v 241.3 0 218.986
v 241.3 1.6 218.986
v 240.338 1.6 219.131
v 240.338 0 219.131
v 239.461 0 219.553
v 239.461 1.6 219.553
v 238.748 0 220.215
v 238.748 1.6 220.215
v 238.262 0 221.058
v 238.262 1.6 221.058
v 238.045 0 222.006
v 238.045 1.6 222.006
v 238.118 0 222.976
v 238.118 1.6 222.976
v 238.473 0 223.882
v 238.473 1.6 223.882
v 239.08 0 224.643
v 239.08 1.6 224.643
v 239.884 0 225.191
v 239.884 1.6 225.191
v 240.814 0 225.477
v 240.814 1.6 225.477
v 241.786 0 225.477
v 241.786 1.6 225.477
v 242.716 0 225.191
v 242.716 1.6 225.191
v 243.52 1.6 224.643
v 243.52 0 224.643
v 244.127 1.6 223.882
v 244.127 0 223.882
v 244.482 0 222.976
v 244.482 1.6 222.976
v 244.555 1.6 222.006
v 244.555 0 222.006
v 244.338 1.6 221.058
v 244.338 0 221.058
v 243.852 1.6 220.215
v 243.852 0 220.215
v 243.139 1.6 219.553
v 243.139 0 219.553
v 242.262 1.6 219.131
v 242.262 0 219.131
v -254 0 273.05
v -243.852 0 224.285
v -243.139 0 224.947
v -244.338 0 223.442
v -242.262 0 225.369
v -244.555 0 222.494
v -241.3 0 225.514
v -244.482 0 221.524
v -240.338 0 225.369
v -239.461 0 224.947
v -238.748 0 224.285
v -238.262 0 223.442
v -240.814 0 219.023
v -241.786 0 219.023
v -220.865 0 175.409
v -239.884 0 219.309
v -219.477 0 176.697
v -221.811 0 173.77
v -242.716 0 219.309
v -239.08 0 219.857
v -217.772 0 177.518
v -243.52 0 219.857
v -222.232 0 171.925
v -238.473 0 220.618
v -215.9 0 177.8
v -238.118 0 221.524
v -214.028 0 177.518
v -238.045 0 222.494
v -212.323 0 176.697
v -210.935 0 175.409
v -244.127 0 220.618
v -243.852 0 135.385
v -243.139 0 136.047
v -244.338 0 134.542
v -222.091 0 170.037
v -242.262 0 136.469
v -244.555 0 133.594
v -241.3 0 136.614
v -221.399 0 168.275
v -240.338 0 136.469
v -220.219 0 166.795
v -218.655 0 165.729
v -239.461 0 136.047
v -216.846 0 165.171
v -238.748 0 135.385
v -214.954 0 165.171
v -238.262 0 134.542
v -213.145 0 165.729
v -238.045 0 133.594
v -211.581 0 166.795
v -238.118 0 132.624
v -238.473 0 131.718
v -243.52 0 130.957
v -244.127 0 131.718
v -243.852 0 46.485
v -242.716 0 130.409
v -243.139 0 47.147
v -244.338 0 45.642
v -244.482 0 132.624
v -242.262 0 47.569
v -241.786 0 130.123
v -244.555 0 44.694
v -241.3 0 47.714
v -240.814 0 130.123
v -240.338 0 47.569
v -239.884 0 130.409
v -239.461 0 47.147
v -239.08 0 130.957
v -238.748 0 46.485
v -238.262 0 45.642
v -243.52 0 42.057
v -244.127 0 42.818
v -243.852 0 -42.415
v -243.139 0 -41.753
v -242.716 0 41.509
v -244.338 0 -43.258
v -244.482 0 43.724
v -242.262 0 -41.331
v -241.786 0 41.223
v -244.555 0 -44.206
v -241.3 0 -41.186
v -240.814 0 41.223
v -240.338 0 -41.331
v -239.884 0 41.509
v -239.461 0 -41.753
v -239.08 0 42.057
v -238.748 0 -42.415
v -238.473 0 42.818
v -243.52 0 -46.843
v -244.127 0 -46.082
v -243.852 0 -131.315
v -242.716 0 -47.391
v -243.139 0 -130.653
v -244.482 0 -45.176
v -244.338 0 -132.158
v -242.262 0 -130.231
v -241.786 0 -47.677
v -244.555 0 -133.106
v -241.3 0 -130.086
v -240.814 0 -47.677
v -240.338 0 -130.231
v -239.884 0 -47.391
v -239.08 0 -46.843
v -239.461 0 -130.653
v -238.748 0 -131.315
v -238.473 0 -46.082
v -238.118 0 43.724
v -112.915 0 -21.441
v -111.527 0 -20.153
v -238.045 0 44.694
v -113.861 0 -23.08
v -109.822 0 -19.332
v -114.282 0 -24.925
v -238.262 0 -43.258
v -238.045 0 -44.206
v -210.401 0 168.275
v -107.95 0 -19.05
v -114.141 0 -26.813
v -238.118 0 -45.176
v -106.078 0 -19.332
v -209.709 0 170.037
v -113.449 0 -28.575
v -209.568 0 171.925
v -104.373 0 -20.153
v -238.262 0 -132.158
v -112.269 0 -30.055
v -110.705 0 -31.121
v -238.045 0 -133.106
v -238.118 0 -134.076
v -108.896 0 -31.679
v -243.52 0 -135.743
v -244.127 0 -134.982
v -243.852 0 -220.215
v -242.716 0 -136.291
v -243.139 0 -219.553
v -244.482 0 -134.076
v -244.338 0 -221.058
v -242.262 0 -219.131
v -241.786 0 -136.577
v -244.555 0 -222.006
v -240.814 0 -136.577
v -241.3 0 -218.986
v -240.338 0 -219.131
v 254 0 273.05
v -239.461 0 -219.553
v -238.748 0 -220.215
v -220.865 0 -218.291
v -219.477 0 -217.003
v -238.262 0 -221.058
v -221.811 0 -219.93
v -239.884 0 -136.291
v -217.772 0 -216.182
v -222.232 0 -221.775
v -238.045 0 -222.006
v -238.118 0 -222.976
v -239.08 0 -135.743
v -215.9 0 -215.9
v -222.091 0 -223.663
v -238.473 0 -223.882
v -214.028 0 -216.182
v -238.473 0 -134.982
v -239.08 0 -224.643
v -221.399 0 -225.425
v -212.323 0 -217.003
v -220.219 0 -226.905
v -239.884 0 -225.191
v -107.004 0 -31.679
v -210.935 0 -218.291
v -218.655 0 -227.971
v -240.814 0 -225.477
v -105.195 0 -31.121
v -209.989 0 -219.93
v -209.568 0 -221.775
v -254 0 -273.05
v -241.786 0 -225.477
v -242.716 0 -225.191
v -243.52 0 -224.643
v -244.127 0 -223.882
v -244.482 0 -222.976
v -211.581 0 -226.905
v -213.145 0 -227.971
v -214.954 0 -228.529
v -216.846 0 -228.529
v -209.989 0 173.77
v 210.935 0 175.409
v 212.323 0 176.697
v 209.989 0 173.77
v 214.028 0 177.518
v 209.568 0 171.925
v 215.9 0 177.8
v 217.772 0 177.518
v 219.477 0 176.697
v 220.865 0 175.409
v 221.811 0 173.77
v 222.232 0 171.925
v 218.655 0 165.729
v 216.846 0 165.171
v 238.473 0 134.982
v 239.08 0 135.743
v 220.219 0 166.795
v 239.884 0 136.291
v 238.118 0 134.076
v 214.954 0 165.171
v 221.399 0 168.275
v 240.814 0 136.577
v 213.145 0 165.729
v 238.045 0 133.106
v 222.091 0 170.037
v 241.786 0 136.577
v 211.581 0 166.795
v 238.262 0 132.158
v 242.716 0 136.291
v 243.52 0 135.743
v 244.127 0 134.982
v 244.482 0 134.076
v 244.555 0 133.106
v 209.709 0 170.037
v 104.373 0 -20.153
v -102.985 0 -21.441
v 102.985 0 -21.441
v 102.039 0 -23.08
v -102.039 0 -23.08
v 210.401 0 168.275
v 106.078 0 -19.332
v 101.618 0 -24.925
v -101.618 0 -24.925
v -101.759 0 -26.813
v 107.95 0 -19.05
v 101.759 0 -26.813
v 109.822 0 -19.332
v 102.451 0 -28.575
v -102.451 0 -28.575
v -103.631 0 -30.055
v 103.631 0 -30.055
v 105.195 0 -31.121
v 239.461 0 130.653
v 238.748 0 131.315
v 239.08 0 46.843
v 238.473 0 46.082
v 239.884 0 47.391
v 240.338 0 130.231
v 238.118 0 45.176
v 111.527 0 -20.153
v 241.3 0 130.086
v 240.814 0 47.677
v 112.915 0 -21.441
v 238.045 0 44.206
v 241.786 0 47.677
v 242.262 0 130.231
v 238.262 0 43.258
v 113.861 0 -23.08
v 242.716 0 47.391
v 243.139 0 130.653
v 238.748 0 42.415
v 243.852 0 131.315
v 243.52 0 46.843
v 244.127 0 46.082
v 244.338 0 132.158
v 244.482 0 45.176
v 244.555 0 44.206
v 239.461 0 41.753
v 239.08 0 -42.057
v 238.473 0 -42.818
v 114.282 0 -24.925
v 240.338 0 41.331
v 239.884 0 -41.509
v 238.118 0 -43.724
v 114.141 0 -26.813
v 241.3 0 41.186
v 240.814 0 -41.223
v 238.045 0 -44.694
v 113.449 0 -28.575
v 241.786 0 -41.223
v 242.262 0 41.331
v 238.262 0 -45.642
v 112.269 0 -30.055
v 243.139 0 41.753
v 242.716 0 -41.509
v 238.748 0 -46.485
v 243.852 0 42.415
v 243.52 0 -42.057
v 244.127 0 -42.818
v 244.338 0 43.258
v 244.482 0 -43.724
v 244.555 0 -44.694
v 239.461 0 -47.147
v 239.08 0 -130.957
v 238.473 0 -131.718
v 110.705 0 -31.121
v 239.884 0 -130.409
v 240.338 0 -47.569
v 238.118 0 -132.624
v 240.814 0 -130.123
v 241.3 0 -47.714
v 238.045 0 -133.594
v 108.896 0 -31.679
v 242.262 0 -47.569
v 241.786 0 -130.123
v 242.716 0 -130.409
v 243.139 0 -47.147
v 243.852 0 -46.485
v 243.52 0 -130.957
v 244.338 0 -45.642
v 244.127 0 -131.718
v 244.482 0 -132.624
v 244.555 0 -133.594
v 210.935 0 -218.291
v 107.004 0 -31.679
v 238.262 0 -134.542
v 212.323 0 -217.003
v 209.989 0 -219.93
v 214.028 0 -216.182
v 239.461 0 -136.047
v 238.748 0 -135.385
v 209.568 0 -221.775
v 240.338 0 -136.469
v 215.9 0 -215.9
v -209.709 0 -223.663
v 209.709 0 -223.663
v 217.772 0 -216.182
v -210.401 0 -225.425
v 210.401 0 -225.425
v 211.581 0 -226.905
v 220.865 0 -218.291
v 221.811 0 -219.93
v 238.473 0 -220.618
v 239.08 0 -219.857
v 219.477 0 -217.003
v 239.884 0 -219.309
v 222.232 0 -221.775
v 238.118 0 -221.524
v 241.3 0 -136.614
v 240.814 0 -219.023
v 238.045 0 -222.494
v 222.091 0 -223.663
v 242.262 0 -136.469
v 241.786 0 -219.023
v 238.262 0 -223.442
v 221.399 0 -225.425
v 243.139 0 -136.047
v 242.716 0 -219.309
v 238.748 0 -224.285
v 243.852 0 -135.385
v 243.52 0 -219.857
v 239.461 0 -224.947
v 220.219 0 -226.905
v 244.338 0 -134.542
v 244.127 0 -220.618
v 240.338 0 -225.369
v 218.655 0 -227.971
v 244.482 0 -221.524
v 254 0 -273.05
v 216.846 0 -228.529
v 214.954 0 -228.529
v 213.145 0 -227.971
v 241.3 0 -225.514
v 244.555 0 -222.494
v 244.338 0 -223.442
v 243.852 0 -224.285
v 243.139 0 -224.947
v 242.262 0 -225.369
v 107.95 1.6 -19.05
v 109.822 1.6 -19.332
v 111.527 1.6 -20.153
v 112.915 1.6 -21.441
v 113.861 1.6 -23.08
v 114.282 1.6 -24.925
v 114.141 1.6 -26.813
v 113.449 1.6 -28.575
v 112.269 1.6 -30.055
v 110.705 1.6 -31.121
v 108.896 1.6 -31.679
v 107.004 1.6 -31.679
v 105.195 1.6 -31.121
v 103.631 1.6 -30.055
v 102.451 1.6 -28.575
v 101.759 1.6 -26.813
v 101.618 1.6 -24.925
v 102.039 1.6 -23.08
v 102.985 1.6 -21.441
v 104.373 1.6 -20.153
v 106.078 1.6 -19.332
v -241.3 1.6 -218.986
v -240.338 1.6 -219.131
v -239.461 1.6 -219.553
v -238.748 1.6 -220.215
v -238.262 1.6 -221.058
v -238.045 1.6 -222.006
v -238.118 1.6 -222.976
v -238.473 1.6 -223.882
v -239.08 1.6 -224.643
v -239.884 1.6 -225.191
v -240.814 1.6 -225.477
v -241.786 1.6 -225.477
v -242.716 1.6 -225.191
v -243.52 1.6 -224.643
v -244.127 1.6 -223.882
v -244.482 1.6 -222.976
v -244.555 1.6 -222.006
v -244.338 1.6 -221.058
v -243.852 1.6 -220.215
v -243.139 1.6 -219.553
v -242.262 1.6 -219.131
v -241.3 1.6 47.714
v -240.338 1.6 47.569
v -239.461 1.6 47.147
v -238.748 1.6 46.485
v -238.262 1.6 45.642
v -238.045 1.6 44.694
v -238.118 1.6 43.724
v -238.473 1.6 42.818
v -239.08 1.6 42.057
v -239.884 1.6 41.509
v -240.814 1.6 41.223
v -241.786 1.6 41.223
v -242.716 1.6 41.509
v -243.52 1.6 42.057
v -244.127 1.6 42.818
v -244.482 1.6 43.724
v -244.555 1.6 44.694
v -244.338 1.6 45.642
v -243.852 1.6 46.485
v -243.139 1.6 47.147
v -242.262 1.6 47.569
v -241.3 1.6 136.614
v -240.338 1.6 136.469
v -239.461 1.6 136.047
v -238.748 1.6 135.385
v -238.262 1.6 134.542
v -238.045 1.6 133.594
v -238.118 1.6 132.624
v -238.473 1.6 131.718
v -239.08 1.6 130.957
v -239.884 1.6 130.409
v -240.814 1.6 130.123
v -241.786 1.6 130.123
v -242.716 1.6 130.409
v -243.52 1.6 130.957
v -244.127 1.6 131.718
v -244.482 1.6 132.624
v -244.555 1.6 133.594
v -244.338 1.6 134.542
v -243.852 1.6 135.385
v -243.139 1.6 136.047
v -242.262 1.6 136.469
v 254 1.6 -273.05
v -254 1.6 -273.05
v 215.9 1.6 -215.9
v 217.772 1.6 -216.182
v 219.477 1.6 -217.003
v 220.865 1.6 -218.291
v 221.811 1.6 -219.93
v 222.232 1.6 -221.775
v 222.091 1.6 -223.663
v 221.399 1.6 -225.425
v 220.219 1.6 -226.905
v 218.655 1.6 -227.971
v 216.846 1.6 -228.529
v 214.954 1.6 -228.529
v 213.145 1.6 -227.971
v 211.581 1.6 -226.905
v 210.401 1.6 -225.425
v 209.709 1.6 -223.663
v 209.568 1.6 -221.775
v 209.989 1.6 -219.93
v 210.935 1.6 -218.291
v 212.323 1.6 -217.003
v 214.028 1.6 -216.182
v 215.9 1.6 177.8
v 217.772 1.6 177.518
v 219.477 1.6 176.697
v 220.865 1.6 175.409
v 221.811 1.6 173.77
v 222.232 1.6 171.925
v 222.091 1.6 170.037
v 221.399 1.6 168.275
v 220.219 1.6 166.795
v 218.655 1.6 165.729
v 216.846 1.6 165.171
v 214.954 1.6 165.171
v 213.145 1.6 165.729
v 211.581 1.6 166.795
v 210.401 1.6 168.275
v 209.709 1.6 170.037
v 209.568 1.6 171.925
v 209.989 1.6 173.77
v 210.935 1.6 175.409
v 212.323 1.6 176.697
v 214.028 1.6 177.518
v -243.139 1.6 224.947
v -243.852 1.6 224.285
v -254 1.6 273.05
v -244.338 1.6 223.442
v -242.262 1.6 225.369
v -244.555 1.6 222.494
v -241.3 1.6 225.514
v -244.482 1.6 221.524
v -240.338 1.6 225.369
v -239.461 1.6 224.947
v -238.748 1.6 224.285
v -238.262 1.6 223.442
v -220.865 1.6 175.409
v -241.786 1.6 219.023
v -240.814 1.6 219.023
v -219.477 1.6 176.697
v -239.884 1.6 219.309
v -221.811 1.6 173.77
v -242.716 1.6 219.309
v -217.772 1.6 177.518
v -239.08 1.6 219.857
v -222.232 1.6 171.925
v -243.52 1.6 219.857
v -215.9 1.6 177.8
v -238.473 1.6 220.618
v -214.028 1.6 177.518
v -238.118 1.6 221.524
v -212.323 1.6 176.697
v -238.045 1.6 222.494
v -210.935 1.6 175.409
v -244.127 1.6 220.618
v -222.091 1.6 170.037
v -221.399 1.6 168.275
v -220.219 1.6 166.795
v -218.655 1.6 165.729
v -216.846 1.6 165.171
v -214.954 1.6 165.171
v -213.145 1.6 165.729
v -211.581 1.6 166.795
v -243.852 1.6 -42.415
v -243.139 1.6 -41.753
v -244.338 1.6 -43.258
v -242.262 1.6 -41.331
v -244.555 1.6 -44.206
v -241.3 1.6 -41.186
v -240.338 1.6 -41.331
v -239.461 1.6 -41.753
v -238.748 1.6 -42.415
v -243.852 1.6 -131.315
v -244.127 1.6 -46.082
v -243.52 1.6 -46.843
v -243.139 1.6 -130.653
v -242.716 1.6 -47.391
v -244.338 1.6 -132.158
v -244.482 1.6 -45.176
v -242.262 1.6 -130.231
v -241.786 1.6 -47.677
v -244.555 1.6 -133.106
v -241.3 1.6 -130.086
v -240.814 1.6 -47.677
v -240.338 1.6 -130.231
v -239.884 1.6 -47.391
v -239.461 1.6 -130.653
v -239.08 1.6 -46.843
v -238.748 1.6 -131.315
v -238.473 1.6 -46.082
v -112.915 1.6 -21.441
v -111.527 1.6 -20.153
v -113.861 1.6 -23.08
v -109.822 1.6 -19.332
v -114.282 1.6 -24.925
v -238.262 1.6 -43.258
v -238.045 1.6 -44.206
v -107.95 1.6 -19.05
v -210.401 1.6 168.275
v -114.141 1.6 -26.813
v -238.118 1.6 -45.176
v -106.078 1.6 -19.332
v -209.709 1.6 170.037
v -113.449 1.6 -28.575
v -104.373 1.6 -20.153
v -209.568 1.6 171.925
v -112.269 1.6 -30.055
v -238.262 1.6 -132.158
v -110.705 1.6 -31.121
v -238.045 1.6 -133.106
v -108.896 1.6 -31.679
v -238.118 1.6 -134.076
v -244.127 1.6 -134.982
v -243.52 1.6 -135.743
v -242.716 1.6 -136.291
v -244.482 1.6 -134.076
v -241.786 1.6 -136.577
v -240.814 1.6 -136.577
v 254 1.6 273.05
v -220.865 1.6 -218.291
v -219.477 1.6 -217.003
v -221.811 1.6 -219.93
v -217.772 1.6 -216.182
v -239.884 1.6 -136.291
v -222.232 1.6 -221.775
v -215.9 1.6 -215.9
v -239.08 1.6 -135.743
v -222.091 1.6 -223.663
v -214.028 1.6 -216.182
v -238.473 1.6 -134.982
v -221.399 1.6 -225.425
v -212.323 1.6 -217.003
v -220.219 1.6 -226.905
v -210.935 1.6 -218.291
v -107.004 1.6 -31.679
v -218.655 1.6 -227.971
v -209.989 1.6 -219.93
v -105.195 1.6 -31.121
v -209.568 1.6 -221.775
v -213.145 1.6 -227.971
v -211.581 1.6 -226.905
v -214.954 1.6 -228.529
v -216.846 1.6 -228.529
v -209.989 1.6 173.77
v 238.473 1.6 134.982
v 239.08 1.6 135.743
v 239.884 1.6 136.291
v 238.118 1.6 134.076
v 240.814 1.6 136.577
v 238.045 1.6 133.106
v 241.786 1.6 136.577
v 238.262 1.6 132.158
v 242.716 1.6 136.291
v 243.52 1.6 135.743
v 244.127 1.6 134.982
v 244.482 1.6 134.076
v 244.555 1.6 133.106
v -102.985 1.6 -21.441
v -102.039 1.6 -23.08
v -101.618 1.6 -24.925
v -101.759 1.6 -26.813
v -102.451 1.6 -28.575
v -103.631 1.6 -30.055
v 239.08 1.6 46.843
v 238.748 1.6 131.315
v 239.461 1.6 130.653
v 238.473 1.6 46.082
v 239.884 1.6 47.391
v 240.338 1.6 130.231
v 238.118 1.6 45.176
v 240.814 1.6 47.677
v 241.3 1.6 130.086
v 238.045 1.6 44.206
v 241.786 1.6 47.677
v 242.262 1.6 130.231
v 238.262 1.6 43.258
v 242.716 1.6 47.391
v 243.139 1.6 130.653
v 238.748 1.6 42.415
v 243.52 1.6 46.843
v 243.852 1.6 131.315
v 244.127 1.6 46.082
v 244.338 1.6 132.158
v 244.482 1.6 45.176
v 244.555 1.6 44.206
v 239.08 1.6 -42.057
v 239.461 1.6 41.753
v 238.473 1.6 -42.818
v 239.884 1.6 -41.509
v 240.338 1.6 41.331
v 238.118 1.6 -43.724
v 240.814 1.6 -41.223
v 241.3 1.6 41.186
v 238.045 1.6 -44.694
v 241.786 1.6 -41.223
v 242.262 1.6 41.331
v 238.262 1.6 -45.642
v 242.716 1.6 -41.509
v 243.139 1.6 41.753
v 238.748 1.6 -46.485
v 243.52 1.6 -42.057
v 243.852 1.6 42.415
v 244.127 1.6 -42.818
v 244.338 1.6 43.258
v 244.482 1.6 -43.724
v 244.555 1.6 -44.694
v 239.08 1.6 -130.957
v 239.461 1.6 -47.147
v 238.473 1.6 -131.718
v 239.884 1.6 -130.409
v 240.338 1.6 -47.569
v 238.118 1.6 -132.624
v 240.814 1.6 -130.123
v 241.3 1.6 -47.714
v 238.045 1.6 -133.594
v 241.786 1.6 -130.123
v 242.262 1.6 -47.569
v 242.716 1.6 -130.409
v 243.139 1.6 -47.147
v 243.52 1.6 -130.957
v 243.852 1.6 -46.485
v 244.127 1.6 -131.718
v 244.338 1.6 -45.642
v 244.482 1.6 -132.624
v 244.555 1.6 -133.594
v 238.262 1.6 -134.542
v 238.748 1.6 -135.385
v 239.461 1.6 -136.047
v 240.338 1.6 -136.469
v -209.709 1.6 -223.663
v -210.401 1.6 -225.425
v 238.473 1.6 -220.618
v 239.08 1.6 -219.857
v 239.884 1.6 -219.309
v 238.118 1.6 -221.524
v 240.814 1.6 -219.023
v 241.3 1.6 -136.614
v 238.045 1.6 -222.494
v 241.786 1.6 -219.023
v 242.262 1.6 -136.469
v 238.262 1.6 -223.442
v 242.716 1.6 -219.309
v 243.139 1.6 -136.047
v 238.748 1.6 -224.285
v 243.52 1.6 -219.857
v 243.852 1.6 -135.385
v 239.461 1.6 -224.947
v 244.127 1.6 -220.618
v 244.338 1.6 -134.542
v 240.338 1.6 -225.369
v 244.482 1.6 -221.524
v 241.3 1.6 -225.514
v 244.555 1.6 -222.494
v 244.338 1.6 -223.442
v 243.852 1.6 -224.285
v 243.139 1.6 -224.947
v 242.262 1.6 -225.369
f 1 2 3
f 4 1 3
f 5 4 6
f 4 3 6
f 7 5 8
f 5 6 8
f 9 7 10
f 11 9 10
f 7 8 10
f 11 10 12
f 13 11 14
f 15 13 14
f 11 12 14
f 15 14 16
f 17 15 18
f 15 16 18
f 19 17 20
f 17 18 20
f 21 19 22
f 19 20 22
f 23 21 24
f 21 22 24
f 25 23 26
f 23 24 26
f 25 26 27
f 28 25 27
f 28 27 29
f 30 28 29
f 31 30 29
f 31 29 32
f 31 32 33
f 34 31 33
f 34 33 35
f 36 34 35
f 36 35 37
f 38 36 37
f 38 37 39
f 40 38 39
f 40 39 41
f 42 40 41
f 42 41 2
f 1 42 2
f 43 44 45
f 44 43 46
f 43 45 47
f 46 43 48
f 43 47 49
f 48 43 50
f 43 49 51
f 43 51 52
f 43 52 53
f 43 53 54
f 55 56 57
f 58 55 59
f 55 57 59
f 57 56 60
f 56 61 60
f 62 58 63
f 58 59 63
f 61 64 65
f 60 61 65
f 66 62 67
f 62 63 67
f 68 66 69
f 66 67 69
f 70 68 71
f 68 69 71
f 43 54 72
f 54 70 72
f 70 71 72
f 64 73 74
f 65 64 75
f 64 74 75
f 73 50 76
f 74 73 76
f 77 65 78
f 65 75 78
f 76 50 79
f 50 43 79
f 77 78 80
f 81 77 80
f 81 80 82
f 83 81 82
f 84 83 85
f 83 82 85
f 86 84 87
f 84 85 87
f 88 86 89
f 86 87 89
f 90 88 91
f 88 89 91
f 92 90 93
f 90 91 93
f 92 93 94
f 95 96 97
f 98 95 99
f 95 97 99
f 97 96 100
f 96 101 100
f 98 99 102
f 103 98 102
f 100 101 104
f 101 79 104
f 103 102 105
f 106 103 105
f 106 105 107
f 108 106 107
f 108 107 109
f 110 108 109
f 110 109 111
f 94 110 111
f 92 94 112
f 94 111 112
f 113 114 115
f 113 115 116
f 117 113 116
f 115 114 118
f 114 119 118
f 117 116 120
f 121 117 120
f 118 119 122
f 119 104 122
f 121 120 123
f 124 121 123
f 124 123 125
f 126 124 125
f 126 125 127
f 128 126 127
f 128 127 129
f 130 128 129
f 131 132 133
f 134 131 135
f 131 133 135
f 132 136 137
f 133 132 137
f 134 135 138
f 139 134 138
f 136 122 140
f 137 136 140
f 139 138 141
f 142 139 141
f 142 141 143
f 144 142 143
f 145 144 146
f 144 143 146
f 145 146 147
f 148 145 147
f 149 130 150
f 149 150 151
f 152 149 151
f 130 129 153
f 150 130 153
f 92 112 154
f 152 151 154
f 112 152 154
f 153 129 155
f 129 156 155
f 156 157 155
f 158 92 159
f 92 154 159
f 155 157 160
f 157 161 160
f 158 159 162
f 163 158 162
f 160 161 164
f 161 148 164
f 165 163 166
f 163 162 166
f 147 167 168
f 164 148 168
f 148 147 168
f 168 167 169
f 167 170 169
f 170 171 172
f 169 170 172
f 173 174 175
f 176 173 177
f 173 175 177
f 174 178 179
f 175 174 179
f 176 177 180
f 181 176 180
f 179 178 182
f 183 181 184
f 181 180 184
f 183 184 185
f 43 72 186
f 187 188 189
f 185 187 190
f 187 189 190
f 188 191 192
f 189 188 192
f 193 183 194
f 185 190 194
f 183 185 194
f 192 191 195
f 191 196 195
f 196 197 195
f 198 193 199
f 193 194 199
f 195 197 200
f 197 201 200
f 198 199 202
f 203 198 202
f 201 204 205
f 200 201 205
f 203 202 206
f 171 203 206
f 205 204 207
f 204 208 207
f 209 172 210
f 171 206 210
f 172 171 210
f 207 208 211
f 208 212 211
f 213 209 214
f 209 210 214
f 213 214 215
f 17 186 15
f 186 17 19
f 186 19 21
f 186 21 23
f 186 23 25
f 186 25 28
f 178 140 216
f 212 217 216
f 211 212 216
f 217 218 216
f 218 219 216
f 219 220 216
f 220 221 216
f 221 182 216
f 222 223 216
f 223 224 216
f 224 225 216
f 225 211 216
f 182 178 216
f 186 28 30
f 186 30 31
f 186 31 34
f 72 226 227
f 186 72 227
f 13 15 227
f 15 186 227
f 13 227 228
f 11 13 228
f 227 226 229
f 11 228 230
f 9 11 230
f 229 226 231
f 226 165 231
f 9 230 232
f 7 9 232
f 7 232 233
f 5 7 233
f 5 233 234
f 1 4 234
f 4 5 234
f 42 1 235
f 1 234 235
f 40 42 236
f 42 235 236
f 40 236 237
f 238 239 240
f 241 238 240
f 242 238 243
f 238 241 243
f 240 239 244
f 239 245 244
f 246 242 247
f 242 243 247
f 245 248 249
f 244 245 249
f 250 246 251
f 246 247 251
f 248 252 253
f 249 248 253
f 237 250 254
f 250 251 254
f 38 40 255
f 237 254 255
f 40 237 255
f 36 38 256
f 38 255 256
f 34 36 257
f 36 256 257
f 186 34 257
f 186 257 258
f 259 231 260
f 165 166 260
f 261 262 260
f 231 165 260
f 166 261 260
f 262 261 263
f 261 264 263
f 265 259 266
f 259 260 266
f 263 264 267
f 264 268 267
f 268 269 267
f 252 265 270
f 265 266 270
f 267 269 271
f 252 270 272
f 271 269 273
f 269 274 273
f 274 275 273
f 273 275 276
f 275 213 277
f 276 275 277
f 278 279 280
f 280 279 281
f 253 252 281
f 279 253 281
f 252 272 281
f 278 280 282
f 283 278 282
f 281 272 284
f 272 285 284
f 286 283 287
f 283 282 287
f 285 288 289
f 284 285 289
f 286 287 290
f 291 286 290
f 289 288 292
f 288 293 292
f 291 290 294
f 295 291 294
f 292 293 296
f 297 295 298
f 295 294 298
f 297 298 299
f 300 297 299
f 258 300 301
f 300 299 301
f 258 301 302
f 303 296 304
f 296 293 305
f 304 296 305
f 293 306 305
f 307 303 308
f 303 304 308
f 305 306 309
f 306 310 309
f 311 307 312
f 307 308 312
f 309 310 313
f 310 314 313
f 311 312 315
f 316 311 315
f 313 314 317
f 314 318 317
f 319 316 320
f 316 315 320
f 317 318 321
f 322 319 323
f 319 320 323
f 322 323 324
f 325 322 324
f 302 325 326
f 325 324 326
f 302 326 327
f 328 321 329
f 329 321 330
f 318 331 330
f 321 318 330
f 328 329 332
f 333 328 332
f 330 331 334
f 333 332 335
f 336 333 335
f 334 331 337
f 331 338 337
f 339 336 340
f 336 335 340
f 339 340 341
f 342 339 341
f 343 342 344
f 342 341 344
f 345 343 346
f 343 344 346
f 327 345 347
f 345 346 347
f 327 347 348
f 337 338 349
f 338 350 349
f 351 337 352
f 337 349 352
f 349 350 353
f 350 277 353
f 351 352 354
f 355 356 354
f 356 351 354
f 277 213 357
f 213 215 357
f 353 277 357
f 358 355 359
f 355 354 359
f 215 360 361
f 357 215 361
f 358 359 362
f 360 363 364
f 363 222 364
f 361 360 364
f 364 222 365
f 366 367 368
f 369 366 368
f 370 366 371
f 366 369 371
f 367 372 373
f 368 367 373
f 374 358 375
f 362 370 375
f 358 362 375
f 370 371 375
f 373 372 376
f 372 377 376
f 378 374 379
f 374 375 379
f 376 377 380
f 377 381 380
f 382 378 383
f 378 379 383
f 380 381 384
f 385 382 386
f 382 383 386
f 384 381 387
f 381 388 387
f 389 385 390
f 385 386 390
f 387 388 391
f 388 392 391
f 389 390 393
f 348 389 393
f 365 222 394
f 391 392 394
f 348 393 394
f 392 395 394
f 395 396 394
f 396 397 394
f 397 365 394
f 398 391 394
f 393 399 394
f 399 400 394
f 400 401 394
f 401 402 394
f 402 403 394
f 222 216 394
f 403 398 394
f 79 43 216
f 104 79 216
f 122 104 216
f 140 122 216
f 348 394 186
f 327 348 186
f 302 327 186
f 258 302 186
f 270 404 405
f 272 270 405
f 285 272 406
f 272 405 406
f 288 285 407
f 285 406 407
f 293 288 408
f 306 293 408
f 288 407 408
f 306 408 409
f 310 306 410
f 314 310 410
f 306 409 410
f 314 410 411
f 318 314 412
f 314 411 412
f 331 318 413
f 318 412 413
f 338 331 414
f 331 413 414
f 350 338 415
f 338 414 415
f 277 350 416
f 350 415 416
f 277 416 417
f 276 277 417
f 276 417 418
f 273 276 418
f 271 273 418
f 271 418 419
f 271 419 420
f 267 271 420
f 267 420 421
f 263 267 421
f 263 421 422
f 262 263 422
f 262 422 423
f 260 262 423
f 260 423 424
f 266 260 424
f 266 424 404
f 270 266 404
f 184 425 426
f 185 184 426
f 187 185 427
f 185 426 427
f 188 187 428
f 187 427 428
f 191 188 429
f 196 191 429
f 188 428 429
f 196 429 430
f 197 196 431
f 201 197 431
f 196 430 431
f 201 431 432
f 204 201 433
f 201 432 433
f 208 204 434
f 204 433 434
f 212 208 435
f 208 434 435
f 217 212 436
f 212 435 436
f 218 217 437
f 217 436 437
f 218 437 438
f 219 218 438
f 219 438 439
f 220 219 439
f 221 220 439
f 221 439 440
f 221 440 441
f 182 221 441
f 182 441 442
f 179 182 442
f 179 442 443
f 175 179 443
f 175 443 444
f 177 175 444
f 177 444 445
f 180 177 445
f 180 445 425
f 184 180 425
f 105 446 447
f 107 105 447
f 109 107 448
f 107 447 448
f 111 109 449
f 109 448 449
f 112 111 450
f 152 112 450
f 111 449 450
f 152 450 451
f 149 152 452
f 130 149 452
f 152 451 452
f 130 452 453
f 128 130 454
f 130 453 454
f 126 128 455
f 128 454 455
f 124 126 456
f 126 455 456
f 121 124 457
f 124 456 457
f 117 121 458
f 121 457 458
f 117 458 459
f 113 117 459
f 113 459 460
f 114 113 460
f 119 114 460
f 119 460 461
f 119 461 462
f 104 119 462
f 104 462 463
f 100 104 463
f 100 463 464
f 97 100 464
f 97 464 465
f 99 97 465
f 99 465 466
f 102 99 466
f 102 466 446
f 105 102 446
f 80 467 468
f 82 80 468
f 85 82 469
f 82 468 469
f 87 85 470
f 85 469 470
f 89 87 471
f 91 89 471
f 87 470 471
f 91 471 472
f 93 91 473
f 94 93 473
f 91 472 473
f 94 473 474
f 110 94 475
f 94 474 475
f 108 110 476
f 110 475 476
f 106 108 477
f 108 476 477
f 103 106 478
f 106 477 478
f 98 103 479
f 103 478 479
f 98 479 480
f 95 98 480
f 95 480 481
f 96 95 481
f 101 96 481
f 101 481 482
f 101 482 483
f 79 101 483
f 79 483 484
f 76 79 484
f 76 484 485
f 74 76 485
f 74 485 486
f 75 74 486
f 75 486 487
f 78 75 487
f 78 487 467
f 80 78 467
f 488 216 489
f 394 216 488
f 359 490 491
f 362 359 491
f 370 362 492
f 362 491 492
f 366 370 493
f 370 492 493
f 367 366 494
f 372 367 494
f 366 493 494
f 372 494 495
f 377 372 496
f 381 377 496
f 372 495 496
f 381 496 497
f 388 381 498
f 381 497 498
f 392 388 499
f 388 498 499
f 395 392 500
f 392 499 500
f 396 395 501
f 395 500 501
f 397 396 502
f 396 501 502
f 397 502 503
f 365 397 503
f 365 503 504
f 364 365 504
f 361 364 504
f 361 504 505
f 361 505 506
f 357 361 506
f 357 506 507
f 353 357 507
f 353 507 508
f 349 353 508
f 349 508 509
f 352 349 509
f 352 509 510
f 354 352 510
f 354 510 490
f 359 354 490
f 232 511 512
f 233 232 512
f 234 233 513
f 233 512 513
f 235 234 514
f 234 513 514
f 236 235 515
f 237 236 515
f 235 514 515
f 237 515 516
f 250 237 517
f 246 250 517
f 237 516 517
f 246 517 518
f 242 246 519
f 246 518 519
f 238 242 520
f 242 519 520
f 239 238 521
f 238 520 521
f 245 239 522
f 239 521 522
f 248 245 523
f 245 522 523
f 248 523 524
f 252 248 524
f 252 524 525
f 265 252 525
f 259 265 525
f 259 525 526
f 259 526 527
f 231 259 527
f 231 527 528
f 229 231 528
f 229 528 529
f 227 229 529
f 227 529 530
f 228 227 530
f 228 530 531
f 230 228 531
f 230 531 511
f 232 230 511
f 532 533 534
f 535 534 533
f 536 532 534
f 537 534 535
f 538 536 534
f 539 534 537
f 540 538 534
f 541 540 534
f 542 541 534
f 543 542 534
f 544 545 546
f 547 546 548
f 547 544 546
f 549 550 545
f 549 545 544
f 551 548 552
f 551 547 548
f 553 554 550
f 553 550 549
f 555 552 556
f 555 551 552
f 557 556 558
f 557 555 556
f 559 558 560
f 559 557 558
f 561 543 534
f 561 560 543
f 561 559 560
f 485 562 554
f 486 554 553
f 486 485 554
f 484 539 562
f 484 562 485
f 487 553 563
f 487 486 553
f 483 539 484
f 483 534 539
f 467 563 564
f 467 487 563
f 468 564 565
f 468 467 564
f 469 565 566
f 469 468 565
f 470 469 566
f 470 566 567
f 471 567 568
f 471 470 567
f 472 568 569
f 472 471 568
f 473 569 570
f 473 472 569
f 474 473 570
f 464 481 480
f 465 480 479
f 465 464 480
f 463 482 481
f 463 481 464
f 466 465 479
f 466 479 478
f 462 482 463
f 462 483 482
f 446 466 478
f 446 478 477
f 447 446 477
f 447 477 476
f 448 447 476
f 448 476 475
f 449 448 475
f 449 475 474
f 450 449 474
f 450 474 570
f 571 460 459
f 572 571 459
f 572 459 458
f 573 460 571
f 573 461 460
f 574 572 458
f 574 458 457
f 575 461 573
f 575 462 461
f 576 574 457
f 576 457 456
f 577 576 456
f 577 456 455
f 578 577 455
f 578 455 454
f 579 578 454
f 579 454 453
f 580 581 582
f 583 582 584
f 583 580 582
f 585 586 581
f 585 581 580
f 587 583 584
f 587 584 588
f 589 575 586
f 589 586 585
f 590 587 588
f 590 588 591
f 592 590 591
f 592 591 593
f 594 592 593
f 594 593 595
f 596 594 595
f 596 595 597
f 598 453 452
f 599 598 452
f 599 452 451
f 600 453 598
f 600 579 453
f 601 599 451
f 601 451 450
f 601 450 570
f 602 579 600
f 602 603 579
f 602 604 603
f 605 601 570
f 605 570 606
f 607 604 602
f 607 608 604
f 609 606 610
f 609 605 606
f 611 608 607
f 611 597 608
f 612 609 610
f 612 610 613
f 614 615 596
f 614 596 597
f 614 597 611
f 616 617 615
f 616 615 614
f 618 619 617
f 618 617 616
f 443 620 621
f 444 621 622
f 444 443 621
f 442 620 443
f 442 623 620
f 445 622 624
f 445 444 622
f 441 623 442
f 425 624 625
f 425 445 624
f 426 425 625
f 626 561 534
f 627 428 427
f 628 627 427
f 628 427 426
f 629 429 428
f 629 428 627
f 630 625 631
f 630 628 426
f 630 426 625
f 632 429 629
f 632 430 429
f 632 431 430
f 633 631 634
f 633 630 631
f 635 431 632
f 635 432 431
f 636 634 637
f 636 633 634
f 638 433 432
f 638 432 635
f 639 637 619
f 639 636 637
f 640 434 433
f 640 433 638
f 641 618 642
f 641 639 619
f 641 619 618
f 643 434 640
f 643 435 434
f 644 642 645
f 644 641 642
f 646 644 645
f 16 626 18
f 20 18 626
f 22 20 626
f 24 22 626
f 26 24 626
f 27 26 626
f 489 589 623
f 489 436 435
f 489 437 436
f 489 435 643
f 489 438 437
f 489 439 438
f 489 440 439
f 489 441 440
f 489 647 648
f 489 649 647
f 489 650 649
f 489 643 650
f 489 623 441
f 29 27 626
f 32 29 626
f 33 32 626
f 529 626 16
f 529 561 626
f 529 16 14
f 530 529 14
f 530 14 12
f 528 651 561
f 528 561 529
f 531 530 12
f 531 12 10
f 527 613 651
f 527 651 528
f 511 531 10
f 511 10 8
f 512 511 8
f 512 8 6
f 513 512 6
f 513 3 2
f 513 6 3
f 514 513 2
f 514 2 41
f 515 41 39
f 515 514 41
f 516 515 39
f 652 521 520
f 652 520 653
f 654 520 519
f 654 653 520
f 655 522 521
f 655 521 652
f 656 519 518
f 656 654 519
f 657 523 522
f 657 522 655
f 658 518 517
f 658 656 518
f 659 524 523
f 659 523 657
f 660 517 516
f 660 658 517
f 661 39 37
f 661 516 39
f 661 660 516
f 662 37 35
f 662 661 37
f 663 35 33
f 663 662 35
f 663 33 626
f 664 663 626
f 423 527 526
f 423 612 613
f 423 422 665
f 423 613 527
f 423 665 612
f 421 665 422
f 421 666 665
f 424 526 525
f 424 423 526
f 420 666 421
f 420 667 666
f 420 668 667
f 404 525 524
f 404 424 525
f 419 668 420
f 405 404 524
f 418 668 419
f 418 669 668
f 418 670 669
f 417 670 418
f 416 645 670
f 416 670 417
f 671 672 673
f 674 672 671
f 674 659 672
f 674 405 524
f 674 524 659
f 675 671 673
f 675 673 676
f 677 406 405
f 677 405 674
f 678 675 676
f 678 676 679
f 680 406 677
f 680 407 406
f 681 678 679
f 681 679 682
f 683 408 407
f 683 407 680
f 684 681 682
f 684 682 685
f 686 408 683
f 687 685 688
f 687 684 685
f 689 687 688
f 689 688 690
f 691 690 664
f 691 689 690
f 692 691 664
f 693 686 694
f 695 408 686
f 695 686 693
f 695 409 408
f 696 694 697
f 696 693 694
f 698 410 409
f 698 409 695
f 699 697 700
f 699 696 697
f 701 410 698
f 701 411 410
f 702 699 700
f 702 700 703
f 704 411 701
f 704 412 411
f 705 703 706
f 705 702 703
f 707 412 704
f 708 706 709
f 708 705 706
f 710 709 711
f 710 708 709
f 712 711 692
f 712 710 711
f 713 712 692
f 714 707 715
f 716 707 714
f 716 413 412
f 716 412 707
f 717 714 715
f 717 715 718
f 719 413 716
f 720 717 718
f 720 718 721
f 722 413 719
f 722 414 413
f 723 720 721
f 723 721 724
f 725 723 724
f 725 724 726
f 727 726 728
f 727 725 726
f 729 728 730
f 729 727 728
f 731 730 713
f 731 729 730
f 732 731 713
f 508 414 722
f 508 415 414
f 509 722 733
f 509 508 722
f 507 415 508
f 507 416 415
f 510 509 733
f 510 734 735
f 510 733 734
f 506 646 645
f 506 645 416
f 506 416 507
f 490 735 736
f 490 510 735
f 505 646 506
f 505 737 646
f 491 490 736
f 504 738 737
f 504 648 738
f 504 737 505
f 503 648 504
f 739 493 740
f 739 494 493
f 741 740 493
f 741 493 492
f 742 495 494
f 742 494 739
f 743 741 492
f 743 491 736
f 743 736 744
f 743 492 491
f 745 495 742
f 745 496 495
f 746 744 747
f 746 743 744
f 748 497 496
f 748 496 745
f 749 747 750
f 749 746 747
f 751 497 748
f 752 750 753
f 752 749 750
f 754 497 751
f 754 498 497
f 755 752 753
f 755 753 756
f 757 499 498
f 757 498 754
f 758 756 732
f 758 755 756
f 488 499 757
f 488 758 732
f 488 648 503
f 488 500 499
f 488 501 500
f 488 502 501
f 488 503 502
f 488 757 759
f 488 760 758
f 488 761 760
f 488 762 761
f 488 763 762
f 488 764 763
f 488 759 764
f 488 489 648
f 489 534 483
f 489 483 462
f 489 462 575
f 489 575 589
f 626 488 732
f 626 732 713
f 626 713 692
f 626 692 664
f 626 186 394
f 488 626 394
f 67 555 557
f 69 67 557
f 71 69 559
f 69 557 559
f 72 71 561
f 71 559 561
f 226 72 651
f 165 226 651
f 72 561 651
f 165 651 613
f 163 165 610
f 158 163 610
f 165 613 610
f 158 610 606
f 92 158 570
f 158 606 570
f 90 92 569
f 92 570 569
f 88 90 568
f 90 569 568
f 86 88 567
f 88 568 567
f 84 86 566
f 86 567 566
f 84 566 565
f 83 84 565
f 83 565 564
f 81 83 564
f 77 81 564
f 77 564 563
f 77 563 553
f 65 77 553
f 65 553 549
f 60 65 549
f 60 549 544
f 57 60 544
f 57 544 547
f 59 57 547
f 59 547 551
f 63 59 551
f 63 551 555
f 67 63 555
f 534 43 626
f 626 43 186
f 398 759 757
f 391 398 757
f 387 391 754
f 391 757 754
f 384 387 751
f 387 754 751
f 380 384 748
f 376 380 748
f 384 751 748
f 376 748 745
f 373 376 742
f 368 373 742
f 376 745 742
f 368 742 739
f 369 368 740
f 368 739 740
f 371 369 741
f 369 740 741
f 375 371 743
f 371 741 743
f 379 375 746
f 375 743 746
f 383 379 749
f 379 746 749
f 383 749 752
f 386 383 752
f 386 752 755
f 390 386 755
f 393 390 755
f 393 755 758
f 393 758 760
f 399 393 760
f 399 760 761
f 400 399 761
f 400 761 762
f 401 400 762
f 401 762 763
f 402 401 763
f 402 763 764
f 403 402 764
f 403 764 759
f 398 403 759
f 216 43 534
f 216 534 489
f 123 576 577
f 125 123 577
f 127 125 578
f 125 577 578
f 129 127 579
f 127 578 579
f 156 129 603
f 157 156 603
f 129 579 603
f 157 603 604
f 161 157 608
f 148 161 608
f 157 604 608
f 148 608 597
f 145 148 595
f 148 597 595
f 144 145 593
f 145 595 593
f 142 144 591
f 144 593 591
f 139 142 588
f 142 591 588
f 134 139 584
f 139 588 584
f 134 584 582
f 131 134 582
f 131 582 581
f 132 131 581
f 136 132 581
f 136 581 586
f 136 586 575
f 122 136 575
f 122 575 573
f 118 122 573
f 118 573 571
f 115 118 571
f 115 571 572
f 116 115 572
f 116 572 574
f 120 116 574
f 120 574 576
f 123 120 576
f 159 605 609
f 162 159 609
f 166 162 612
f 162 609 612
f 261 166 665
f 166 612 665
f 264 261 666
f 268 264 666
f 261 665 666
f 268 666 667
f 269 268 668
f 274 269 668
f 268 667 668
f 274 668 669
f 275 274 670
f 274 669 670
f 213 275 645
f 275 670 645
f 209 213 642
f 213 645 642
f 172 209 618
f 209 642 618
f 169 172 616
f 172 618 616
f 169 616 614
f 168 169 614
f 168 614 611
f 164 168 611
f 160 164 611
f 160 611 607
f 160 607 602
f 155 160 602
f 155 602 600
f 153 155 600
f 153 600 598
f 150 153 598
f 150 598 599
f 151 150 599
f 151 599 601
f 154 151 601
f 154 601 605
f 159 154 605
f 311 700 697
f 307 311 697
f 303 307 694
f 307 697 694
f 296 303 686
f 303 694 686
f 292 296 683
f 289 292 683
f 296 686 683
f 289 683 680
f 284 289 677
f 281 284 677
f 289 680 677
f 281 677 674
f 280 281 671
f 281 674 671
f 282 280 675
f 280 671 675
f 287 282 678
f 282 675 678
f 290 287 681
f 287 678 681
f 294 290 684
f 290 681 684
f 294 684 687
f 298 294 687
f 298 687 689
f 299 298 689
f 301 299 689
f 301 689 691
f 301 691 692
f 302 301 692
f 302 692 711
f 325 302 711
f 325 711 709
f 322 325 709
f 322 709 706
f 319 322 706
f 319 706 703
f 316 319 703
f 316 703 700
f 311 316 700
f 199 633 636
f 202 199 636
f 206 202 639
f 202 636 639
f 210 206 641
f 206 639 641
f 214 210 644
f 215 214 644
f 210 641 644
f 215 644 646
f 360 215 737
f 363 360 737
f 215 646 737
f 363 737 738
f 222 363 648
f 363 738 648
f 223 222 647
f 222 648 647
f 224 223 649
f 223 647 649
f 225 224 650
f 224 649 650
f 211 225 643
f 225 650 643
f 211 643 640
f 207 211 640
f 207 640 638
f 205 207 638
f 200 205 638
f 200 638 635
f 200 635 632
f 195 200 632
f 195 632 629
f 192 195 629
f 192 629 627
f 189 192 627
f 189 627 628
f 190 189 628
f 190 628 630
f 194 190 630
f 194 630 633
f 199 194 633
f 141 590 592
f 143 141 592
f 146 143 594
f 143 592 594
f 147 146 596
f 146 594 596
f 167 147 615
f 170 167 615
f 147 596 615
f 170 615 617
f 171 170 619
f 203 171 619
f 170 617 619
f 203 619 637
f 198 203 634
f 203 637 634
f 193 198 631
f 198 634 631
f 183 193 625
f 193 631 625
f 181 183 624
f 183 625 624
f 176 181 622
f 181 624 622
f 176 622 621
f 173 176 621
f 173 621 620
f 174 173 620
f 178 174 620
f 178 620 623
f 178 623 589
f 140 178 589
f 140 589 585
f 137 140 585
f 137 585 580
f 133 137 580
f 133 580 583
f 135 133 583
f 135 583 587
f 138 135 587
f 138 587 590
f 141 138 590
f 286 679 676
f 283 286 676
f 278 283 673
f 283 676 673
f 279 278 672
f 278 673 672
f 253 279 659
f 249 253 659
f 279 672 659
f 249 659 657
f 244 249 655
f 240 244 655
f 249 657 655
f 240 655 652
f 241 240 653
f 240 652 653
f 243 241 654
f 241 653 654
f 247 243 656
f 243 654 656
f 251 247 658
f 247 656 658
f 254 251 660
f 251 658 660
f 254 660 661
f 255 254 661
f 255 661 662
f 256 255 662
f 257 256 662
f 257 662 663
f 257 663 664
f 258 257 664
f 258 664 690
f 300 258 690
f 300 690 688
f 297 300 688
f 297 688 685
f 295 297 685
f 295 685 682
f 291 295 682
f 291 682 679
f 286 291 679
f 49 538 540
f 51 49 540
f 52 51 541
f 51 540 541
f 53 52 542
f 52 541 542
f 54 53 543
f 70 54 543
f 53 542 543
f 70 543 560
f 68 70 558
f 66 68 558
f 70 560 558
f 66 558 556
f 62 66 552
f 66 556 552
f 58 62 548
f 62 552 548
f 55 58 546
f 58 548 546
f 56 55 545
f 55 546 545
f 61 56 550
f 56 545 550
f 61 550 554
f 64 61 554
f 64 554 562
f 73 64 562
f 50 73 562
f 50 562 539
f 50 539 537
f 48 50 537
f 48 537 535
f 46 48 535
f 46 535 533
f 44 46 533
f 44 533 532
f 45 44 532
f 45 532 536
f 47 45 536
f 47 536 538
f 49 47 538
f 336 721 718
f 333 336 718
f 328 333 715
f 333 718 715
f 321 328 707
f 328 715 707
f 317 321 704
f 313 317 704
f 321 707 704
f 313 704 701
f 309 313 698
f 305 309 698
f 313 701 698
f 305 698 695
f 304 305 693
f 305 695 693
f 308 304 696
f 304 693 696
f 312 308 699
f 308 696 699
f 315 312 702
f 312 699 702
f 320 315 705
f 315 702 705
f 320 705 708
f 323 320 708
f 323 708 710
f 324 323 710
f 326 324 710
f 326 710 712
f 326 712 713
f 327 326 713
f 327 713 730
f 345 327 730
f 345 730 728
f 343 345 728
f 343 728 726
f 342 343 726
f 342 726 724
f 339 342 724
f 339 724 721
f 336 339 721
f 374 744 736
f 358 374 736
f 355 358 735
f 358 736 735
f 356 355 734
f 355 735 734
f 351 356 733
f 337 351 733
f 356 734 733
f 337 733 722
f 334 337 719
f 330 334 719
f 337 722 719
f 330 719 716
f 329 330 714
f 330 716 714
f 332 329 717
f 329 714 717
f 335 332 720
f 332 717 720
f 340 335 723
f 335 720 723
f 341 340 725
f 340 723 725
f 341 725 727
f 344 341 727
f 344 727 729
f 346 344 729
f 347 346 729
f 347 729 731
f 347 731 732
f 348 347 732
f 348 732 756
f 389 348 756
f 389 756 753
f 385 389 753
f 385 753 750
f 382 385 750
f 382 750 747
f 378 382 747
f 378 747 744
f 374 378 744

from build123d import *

# Parameters (mm, degrees)
SKETCH1_W           = 508
SKETCH1_H           = 546.1
BOSS_EXTRUDE1_DEPTH = 1.6002
SKETCH2_R           = 6.35
CUT_EXTRUDE1_DEPTH  = 2.54
SKETCH3_R           = 3.2639
CUT_EXTRUDE3_DEPTH  = 373.927423422
SKETCH4_R           = 6.35
CUT_EXTRUDE4_DEPTH  = 2.54


with BuildPart() as part:
    # Sketch1 → Boss-Extrude1 (new body)
    with BuildSketch(Plane(origin=(0, 0, 0), x_dir=(1, 0, 0), z_dir=(0, 1, 0))):
        Rectangle(SKETCH1_W, SKETCH1_H)
    extrude(amount=BOSS_EXTRUDE1_DEPTH)

    # Sketch2 → Cut-Extrude1 (cut)
    with BuildSketch(Plane(origin=(0, 1.6002, 0), x_dir=(1, 0, 0), z_dir=(0, 1, 0))):
        with Locations(Location((215.9, 222.25, 0), (0, 0, 270))):
            Circle(SKETCH2_R)
        with Locations(Location((215.9, -171.45, 0), (0, 0, 270))):
            Circle(SKETCH2_R)
        with Locations(Location((-215.9, 222.25, 0), (0, 0, 270))):
            Circle(SKETCH2_R)
        with Locations(Location((-215.9, -171.45, 0), (0, 0, 270))):
            Circle(SKETCH2_R)
    extrude(amount=-CUT_EXTRUDE1_DEPTH, mode=Mode.SUBTRACT)

    # Sketch3 → Cut-Extrude3 (cut, through all)
    with BuildSketch(Plane(origin=(0, 1.6002, 0), x_dir=(1, 0, 0), z_dir=(0, 1, 0))):
        with Locations(Location((-241.3, 222.25, 0), (0, 0, 270))):
            Circle(SKETCH3_R)
        with Locations(Location((-241.3, 133.35, 0), (0, 0, 270))):
            Circle(SKETCH3_R)
        with Locations(Location((-241.3, 44.45, 0), (0, 0, 270))):
            Circle(SKETCH3_R)
        with Locations(Location((-241.3, -44.45, 0), (0, 0, 270))):
            Circle(SKETCH3_R)
        with Locations(Location((-241.3, -133.35, 0), (0, 0, 270))):
            Circle(SKETCH3_R)
        with Locations(Location((-241.3, -222.25, 0), (0, 0, 270))):
            Circle(SKETCH3_R)
        with Locations(Location((241.3, 222.25, 0), (0, 0, 90))):
            Circle(SKETCH3_R)
        with Locations(Location((241.3, 133.35, 0), (0, 0, 90))):
            Circle(SKETCH3_R)
        with Locations(Location((241.3, 44.45, 0), (0, 0, 90))):
            Circle(SKETCH3_R)
        with Locations(Location((241.3, -44.45, 0), (0, 0, 90))):
            Circle(SKETCH3_R)
        with Locations(Location((241.3, -133.35, 0), (0, 0, 90))):
            Circle(SKETCH3_R)
        with Locations(Location((241.3, -222.25, 0), (0, 0, 90))):
            Circle(SKETCH3_R)
    extrude(amount=-CUT_EXTRUDE3_DEPTH, mode=Mode.SUBTRACT)

    # Sketch4 → Cut-Extrude4 (cut)
    with BuildSketch(Plane(origin=(0, 1.6002, 0), x_dir=(1, 0, 0), z_dir=(0, 1, 0))):
        with Locations(Location((107.95, 25.4, 0), (0, 0, 270))):
            Circle(SKETCH4_R)
        with Locations(Location((-107.95, 25.4, 0), (0, 0, 270))):
            Circle(SKETCH4_R)
    extrude(amount=-CUT_EXTRUDE4_DEPTH, mode=Mode.SUBTRACT)


solid = part.part
